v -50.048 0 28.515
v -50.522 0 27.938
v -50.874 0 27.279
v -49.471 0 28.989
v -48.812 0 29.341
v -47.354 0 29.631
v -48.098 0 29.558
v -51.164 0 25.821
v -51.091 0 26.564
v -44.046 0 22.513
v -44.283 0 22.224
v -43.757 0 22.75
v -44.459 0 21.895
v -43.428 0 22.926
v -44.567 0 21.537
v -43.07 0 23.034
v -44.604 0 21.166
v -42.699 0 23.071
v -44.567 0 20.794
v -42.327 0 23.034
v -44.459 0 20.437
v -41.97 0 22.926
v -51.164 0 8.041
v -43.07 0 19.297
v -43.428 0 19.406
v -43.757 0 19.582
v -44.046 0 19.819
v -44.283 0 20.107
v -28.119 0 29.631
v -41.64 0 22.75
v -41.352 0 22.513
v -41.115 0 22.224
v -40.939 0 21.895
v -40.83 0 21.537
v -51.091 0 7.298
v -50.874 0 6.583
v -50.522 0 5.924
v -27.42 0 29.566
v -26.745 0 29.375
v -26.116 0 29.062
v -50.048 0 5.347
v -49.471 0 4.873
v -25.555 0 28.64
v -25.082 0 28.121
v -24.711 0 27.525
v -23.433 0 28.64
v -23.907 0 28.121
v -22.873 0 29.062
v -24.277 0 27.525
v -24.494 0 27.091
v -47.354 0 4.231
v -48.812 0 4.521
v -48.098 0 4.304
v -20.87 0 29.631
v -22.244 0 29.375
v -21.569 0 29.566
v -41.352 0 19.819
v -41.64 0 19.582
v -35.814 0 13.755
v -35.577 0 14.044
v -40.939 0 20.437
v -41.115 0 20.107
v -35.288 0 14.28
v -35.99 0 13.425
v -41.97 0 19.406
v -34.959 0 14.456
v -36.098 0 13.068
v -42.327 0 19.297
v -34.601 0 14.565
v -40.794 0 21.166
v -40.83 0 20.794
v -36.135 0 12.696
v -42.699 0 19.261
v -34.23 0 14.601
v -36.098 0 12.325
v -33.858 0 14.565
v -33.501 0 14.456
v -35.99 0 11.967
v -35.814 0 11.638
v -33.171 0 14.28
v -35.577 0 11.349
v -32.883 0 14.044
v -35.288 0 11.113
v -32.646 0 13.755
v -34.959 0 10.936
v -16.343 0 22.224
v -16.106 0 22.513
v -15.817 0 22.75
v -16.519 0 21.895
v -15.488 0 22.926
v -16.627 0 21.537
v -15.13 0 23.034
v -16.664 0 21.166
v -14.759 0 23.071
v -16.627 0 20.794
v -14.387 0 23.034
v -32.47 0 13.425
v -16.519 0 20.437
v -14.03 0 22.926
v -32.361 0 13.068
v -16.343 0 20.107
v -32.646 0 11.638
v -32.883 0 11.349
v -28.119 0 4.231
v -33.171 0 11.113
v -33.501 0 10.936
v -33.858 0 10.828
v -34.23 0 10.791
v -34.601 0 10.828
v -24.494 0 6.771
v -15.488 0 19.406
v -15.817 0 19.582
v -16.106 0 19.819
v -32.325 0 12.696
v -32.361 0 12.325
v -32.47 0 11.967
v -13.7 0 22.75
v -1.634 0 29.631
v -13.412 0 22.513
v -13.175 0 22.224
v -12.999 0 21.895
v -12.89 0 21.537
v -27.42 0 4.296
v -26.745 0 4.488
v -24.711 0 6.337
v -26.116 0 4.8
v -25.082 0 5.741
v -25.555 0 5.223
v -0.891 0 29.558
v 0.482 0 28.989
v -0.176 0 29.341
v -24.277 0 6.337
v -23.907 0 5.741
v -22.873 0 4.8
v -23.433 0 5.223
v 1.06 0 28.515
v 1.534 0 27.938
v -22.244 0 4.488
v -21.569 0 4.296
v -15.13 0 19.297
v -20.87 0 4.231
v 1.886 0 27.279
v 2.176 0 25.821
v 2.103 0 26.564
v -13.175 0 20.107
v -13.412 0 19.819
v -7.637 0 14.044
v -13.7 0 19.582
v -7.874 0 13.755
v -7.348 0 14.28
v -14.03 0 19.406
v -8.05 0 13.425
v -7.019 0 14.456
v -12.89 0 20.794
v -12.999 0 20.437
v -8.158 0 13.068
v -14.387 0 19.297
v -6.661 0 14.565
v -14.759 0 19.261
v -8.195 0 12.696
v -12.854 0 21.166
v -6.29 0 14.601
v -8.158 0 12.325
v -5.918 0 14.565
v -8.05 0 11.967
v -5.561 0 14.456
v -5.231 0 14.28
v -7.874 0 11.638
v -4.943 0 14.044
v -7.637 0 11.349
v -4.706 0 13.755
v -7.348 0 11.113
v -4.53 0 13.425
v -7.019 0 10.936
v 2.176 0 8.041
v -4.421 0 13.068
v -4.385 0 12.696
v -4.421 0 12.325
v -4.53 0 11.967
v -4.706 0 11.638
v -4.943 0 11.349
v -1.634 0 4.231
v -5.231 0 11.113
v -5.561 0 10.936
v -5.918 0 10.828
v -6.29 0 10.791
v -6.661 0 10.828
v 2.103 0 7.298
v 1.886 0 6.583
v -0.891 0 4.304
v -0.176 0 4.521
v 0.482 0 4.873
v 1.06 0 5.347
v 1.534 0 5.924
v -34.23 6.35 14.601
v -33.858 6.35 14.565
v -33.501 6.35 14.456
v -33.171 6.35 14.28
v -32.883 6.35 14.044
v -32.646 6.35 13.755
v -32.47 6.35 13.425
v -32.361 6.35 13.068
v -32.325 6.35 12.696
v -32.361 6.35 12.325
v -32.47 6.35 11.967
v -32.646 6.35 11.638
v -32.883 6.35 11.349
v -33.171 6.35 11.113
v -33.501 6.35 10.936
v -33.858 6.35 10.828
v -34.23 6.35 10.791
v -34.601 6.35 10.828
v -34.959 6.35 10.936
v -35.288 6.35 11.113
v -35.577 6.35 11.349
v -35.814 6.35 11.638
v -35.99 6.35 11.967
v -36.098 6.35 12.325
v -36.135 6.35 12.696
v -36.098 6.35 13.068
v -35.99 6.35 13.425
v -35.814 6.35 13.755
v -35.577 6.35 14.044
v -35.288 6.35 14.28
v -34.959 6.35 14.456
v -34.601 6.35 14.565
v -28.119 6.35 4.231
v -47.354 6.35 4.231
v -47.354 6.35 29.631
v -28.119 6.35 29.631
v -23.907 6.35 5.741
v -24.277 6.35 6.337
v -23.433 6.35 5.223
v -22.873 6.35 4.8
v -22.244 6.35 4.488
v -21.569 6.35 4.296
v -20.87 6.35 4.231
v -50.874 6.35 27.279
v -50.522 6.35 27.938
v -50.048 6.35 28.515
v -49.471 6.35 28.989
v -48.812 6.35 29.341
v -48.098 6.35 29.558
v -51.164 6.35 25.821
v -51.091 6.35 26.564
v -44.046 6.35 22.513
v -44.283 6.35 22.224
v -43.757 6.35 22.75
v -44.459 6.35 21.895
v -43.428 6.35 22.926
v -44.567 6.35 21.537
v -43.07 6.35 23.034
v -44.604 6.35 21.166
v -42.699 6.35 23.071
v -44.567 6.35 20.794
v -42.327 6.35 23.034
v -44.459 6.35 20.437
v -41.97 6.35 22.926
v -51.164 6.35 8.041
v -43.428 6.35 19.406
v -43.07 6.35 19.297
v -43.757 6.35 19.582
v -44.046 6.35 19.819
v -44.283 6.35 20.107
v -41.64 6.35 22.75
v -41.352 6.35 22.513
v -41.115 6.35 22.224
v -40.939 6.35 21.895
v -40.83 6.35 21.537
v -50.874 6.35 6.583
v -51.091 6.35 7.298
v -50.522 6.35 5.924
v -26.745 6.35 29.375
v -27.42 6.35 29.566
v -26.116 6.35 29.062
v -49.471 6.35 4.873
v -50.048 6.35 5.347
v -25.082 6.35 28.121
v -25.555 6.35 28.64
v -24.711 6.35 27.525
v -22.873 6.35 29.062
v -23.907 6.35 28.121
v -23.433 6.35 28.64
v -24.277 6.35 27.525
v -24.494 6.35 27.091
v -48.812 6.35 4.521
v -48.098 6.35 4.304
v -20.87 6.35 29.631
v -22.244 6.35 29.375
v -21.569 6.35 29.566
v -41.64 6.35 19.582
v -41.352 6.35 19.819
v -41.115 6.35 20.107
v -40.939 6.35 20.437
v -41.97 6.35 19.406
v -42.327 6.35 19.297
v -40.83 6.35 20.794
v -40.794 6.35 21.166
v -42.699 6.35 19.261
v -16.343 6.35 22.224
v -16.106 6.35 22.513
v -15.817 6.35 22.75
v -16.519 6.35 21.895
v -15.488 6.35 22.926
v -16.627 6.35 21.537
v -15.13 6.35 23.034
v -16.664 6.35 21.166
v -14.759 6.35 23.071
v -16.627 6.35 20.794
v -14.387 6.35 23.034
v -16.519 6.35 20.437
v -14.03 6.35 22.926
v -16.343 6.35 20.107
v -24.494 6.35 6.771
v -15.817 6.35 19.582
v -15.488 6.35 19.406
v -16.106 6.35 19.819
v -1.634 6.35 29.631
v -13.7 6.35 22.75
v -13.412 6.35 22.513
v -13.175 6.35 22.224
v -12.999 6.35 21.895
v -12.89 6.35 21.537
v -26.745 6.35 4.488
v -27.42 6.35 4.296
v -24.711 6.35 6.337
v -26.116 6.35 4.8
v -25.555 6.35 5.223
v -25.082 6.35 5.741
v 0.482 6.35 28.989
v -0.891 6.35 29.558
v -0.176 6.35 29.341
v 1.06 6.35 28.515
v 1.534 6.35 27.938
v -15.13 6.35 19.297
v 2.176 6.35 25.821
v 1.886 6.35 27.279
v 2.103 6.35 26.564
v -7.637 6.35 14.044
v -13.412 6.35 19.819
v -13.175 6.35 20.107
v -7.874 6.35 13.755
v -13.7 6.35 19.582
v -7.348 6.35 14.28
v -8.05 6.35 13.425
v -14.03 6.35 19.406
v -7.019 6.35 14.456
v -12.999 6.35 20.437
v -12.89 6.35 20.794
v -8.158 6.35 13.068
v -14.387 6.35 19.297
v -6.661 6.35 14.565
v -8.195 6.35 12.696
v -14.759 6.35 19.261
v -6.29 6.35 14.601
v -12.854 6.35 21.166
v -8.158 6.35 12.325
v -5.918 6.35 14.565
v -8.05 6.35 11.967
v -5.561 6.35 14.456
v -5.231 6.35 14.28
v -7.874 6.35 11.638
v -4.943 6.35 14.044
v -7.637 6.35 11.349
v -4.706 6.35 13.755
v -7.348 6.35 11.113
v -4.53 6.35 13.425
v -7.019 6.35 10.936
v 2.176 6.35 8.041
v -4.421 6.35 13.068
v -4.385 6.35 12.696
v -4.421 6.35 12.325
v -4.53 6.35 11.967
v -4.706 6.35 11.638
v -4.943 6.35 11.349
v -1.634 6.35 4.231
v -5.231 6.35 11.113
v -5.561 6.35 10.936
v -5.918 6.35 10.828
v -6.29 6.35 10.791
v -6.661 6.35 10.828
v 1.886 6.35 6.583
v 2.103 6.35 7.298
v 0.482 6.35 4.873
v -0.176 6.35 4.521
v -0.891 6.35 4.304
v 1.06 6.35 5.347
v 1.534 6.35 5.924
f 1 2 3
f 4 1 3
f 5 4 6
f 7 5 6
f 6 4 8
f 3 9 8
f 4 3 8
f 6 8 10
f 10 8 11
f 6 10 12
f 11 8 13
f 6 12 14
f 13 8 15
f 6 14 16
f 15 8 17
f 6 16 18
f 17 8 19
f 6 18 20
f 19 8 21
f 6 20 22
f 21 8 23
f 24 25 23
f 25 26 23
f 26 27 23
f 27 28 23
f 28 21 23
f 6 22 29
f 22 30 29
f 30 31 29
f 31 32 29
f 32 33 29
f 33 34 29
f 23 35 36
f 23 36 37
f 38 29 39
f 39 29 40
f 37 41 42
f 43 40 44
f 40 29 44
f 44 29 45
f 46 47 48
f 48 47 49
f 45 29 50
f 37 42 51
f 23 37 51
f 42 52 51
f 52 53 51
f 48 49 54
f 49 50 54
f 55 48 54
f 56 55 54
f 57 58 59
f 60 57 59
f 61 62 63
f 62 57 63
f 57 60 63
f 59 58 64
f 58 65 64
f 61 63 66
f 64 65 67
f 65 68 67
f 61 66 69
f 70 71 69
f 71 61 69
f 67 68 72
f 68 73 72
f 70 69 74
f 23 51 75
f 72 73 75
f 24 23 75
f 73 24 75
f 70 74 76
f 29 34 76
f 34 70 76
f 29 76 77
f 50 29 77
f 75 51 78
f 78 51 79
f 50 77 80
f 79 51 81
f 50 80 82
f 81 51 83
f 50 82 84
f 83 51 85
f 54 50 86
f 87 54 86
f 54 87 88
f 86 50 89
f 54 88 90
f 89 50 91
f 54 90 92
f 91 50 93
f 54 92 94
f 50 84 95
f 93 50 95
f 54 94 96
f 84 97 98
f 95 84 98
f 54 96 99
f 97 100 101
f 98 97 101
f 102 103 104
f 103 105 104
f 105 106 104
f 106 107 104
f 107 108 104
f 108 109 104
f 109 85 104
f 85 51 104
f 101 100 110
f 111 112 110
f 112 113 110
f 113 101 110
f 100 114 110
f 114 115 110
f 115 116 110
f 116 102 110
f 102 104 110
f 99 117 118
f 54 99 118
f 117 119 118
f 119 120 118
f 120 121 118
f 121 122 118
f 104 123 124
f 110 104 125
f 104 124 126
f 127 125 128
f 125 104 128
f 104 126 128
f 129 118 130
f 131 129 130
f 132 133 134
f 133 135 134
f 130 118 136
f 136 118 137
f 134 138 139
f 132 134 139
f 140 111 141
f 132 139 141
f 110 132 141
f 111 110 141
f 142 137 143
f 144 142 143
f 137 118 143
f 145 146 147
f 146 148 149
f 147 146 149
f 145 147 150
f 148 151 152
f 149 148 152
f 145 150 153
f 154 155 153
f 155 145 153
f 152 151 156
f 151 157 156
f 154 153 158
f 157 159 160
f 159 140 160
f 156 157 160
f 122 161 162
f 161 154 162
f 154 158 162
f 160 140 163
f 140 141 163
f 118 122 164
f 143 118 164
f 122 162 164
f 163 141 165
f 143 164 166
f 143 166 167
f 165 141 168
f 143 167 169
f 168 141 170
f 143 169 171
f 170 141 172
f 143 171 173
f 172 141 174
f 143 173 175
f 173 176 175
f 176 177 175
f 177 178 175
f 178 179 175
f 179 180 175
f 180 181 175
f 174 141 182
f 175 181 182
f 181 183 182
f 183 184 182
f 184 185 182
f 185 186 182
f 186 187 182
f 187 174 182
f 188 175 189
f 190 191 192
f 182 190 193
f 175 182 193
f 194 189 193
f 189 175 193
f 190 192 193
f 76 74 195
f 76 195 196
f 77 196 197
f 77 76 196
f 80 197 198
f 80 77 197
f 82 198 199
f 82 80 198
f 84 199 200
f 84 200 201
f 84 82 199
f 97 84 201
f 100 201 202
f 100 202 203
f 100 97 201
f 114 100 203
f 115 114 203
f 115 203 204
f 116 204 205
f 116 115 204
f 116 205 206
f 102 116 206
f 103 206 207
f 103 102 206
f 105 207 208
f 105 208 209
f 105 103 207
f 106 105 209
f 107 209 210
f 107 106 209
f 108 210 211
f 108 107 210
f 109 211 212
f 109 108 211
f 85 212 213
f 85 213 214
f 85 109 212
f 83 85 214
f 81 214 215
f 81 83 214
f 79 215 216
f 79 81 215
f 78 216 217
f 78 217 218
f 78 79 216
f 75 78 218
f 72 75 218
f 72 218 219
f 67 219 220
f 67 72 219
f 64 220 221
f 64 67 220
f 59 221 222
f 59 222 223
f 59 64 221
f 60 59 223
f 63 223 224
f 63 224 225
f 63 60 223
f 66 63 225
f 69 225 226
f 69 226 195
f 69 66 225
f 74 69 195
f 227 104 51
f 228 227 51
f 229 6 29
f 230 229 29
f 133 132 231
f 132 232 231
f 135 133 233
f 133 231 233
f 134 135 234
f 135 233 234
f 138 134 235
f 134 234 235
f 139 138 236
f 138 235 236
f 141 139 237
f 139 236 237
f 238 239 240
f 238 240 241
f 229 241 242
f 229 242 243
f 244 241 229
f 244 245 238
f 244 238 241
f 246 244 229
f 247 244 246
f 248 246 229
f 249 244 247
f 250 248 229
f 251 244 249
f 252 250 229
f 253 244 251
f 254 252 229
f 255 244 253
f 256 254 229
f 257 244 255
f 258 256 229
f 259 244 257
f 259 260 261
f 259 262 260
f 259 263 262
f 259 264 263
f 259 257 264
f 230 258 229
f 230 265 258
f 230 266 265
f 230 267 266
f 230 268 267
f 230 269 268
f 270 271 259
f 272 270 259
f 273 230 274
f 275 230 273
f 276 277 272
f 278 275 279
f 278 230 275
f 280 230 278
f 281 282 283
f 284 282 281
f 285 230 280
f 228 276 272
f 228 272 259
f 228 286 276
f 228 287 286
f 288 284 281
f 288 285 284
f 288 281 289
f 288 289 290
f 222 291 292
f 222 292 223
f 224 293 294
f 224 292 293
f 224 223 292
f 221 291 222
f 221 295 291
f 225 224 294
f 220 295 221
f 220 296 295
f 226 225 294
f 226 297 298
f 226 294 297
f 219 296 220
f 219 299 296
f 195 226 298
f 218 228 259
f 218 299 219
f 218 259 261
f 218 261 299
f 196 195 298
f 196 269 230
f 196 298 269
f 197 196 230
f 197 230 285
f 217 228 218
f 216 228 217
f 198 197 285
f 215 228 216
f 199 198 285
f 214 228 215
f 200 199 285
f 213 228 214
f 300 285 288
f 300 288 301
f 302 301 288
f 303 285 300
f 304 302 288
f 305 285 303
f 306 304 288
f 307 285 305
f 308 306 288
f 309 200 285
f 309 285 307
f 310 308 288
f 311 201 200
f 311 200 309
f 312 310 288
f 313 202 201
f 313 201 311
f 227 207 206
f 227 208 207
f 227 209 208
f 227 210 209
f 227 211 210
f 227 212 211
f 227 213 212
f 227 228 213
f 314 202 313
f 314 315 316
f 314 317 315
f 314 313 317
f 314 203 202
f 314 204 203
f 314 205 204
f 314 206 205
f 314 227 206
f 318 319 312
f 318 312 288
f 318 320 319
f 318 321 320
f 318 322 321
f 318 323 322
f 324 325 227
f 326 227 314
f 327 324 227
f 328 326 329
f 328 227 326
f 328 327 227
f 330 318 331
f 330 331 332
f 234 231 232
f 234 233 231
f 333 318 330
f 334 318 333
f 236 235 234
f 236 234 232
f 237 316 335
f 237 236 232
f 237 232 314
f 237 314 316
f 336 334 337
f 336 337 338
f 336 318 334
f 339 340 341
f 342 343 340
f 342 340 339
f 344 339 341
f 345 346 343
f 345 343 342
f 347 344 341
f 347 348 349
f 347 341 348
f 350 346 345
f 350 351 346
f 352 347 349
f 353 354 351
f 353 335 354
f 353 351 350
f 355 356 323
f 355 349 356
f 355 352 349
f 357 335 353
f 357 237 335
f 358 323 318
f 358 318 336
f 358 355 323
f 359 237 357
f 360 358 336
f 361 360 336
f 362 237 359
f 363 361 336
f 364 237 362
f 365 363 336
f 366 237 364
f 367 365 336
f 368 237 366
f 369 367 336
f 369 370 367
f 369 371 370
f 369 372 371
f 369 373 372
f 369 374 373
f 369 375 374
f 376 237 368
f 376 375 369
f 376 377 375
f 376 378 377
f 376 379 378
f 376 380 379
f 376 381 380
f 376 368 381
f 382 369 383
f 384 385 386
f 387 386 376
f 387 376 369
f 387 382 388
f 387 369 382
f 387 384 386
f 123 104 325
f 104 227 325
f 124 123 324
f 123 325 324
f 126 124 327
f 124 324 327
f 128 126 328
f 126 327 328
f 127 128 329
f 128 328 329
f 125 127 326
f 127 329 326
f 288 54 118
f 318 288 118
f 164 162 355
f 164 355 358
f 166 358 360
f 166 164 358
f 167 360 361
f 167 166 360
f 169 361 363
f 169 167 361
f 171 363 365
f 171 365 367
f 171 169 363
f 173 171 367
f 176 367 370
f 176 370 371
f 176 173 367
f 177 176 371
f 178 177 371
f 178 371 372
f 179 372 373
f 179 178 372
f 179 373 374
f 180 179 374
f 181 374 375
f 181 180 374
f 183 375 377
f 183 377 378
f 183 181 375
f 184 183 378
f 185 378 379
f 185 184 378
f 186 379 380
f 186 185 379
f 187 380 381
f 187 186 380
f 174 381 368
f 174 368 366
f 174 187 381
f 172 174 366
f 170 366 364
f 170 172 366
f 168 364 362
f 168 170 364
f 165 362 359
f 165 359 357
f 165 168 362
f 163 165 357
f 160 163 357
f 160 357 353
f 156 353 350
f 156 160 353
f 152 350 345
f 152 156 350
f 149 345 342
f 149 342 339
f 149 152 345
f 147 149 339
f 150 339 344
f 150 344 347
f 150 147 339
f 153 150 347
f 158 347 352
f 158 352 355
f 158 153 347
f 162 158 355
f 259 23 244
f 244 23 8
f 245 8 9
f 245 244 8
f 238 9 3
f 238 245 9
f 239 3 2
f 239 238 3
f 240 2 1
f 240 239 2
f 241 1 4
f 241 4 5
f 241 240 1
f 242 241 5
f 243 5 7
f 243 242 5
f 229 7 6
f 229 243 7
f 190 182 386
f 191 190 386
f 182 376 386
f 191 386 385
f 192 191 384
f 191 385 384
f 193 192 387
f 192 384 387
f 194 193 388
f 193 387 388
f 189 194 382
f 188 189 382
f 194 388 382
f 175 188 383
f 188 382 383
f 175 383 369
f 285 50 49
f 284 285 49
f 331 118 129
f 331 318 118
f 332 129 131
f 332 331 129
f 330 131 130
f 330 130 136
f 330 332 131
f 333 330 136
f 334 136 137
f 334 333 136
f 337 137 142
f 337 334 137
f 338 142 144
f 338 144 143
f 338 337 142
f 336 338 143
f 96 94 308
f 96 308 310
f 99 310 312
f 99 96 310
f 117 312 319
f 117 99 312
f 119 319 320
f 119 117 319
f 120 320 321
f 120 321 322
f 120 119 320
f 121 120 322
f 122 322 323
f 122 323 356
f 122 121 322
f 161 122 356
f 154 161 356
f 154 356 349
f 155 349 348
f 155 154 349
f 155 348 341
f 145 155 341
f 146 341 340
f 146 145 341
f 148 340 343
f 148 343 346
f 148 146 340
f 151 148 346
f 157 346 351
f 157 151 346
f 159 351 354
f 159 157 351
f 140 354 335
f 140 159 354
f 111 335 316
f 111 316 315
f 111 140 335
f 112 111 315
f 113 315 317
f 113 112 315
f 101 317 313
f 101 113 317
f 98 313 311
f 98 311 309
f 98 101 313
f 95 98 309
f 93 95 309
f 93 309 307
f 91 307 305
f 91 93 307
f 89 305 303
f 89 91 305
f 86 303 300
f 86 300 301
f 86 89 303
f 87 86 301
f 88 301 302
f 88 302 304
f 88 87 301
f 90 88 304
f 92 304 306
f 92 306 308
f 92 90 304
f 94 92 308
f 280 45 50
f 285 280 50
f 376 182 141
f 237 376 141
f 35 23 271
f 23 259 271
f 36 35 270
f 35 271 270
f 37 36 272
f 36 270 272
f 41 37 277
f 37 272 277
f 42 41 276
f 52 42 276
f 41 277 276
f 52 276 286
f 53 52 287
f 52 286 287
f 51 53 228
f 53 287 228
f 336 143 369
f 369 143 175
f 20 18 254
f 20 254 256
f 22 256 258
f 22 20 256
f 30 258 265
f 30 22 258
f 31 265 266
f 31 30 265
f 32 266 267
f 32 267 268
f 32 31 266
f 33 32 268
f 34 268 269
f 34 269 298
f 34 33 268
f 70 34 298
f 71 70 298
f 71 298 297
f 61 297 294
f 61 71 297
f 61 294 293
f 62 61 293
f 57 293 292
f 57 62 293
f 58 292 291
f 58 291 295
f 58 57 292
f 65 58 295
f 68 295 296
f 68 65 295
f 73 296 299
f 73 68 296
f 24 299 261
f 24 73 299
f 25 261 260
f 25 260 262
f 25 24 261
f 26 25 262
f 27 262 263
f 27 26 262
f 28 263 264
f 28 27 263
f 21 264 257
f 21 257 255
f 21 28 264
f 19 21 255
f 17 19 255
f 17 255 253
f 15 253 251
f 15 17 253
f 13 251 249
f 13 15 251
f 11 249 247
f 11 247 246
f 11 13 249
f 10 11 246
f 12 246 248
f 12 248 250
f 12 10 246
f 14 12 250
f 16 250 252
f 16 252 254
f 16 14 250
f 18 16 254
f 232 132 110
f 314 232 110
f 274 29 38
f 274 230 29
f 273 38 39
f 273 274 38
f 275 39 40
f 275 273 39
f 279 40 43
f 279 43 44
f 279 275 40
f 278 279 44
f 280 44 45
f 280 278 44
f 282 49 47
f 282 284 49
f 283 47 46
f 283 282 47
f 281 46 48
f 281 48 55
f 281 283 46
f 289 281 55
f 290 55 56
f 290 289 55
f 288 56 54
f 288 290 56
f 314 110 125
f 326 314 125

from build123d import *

# Parameters (mm, degrees)
SKETCH1_R           = 1.905
BOSS_EXTRUDE1_DEPTH = 6.35
FILLET1_R           = 3.81


with BuildPart() as part:
    # Sketch1 → Boss-Extrude1 (new body)
    with BuildSketch(Plane(origin=(0, 0, 0), x_dir=(1, 0, 0), z_dir=(0, 1, 0))):
        Polygon((-51.164237676, -4.231087287), (-51.164237676, -29.631087287), (-25.764237676, -29.631087287), (-24.494237676, -27.091087287), (-23.224237676, -29.631087287), (2.175762324, -29.631087287), (2.175762324, -4.231087287), (-23.224237676, -4.231087287), (-24.494237676, -6.771087287), (-25.764237676, -4.231087287), align=None)
        with Locations(Location((-42.698849573, -21.165699184, 0), (0, 0, 270))):
            Circle(SKETCH1_R, mode=Mode.SUBTRACT)
        with Locations(Location((-34.22962578, -12.696475391, 0), (0, 0, 270))):
            Circle(SKETCH1_R, mode=Mode.SUBTRACT)
        with Locations(Location((-14.758849573, -21.165699184, 0), (0, 0, 270))):
            Circle(SKETCH1_R, mode=Mode.SUBTRACT)
        with Locations(Location((-6.28962578, -12.696475391, 0), (0, 0, 270))):
            Circle(SKETCH1_R, mode=Mode.SUBTRACT)
    extrude(amount=BOSS_EXTRUDE1_DEPTH)

    # Fillet1
    fillet1_edges = [part.edges().sort_by_distance(p)[0] for p in [
        (-51.164237676, 3.175, 29.631087287),
        (-51.164237676, 3.175, 4.231087287),
        (-25.764237676, 3.175, 4.231087287),
        (-23.224237676, 3.175, 4.231087287),
        (2.175762324, 3.175, 4.231087287),
        (2.175762324, 3.175, 29.631087287),
        (-23.224237676, 3.175, 29.631087287),
        (-25.764237676, 3.175, 29.631087287),
    ]]
    fillet(fillet1_edges, radius=FILLET1_R)


solid = part.part
